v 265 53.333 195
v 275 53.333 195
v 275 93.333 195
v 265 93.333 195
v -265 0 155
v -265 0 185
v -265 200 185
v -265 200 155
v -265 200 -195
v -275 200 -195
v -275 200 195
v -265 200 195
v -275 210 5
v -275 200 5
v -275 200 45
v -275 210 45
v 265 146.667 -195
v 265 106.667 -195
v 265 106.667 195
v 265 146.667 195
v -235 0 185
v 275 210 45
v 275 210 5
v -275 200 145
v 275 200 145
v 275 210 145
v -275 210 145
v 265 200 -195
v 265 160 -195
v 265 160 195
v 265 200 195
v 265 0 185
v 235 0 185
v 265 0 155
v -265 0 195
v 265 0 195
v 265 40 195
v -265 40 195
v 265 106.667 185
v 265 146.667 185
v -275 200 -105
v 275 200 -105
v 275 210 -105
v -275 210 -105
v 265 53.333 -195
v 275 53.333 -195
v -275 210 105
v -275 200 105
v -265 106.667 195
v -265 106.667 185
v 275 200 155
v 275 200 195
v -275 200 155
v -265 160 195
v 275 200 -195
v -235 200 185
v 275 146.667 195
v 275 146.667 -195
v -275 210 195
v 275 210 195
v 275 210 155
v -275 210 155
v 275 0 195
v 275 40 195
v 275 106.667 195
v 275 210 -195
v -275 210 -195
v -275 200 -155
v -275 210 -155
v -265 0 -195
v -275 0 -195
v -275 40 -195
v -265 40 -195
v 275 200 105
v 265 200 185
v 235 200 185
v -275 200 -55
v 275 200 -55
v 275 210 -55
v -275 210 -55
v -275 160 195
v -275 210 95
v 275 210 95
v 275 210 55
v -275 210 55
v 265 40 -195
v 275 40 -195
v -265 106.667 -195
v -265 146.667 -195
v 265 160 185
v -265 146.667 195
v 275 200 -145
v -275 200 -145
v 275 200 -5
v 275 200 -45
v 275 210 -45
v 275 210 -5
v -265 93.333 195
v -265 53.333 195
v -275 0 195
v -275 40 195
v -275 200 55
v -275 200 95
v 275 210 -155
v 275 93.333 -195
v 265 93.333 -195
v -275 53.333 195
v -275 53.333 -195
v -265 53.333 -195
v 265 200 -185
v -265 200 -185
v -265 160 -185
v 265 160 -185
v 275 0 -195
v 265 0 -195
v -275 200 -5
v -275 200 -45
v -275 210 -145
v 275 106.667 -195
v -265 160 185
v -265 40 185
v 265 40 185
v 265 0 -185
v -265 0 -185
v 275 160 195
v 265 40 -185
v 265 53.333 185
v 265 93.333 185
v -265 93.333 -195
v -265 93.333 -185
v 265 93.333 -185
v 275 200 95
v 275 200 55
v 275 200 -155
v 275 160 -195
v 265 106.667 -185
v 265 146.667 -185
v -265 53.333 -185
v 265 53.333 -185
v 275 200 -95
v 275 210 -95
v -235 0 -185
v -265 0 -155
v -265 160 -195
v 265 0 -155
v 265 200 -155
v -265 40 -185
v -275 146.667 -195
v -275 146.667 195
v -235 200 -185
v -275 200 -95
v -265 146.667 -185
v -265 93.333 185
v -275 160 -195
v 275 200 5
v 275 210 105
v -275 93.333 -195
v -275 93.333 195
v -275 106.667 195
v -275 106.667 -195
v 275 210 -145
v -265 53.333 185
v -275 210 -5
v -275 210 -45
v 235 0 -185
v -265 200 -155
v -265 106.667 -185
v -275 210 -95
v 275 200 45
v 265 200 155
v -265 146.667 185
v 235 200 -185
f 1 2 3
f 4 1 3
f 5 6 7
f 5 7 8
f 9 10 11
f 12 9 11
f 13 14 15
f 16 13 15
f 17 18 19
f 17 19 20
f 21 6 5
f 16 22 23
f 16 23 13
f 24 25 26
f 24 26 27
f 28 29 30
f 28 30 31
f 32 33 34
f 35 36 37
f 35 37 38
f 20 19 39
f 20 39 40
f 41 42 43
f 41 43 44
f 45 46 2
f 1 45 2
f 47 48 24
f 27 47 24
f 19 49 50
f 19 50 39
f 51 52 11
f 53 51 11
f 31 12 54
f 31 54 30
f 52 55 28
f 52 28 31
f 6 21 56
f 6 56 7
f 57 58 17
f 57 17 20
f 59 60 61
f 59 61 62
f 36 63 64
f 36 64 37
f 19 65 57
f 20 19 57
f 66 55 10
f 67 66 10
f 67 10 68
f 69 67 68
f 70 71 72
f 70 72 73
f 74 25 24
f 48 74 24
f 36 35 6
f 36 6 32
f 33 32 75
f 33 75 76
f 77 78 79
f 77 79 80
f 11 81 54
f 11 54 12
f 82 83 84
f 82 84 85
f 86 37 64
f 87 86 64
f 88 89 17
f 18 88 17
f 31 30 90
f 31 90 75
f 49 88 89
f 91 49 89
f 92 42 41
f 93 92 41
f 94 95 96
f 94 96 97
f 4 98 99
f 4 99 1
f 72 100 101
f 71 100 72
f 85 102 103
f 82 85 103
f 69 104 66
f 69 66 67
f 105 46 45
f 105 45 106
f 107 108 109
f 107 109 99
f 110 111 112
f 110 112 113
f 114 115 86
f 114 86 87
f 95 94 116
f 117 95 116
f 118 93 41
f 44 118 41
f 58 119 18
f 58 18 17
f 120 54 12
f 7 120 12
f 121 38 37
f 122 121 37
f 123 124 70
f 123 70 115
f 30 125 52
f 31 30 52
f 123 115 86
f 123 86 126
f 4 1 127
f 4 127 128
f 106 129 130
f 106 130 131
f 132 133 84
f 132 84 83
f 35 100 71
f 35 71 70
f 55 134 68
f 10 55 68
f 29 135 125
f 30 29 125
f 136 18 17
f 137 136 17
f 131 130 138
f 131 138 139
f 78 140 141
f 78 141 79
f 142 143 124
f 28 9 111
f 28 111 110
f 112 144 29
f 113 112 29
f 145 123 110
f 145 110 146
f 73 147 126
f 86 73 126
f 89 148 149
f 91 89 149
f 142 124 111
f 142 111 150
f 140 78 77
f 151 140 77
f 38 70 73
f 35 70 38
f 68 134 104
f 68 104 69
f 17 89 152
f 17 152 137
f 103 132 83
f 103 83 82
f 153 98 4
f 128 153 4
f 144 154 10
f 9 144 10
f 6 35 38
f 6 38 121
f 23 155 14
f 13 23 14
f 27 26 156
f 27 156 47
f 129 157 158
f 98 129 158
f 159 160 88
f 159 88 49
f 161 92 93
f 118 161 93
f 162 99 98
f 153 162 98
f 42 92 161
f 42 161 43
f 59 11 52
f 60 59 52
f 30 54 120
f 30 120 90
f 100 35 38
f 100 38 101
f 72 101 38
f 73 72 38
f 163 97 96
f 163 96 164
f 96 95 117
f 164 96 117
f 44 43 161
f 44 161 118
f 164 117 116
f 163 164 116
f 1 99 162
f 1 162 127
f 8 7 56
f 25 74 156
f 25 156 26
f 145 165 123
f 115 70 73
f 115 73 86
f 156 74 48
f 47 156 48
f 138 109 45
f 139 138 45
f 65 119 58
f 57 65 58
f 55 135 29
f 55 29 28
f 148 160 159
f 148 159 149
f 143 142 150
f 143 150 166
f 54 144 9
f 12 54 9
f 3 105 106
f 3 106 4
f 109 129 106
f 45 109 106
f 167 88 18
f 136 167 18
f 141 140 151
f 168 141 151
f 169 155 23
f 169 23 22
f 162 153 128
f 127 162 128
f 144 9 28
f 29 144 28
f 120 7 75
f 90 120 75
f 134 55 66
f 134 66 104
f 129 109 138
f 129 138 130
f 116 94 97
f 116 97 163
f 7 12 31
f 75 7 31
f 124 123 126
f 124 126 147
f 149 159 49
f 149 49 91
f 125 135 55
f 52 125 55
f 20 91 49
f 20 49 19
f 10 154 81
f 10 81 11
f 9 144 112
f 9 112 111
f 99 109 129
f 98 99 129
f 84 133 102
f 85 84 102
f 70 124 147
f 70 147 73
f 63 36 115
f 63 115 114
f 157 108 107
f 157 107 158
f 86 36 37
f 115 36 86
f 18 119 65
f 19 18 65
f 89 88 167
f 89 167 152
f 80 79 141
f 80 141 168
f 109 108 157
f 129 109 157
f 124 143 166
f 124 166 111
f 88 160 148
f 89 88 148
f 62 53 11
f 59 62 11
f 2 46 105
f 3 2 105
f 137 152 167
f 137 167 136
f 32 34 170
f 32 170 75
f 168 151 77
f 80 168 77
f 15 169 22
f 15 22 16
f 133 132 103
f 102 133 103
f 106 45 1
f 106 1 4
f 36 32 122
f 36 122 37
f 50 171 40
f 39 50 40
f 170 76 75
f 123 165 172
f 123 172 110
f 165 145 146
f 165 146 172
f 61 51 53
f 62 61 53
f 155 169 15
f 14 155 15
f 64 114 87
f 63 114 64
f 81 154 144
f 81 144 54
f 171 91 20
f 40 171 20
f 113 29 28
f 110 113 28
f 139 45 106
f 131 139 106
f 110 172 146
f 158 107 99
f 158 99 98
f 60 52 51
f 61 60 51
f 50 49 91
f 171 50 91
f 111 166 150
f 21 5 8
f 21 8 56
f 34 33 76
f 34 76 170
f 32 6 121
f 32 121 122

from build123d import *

# Parameters (mm, degrees)
F4_DEPTH  = 40
F5_DEPTH  = 200
F6_DEPTH  = 40
F7_W      = 40
F7_H      = 390
F8_DEPTH  = 10
F10_W     = 530
F10_H     = 40
F11_DEPTH = 10
F13_W     = 530
F13_H     = 10
F14_DEPTH = 10
F13_W_2   = 550
F13_H_2   = 40
F15_DEPTH = 10


with BuildPart() as f4:
    # F3 (on Front) → F4 (new body)
    with BuildSketch(Plane.XZ):
        Polygon((-265, 195), (-275, 195), (-275, -195), (-265, -195), (-265, -185), (-265, -155), (-265, 155), (-265, 185), align=None)
    extrude(amount=-F4_DEPTH)


with BuildPart() as f4b:
    # F3 (on Front) → F4, piece 2 (new body)
    with BuildSketch(Plane.XZ):
        Polygon((275, 195), (265, 195), (265, 185), (265, 155), (265, -155), (265, -185), (265, -195), (275, -195), align=None)
    extrude(amount=-F4_DEPTH)


with BuildPart() as f5:
    # F3 (on Front) → F5 (new body)
    with BuildSketch(Plane.XZ):
        Polygon((-235, 185), (-265, 185), (-265, 155), align=None)
    extrude(amount=-F5_DEPTH)


with BuildPart() as f5b:
    # F3 (on Front) → F5, piece 2 (new body)
    with BuildSketch(Plane.XZ):
        Polygon((265, 155), (265, 185), (235, 185), align=None)
    extrude(amount=-F5_DEPTH)


with BuildPart() as f5c:
    # F3 (on Front) → F5, piece 3 (new body)
    with BuildSketch(Plane.XZ):
        Polygon((235, -185), (265, -185), (265, -155), align=None)
    extrude(amount=-F5_DEPTH)


with BuildPart() as f5d:
    # F3 (on Front) → F5, piece 4 (new body)
    with BuildSketch(Plane.XZ):
        Polygon((-265, -155), (-265, -185), (-235, -185), align=None)
    extrude(amount=-F5_DEPTH)


with BuildPart() as f6:
    # F3 (on Front) → F6 (new body)
    with BuildSketch(Plane.XZ):
        Polygon((265, 195), (-265, 195), (-265, 185), (-235, 185), (235, 185), (265, 185), align=None)
    extrude(amount=-F6_DEPTH)


with BuildPart() as f6b:
    # F3 (on Front) → F6, piece 2 (new body)
    with BuildSketch(Plane.XZ):
        Polygon((-265, -185), (-265, -195), (265, -195), (265, -185), (235, -185), (-235, -185), align=None)
    extrude(amount=-F6_DEPTH)


with BuildPart() as f8:
    # F7 (on face) → F8 (new body, through all)
    with BuildSketch(Plane.YZ.offset(275)):
        with Locations((73.3333333333, 0)):
            Rectangle(F7_W, F7_H)
    extrude(amount=-F8_DEPTH)


with BuildPart() as f8b:
    # F7 (on face) → F8, piece 2 (new body, through all)
    with BuildSketch(Plane.YZ.offset(275)):
        with Locations((126.6666666667, 0)):
            Rectangle(F7_W, F7_H)
    extrude(amount=-F8_DEPTH)


with BuildPart() as f8c:
    # F7 (on face) → F8, piece 3 (new body, through all)
    with BuildSketch(Plane.YZ.offset(275)):
        with Locations((180, 0)):
            Rectangle(F7_W, F7_H)
    extrude(amount=-F8_DEPTH)


with BuildPart() as f9_1:
    # F9: instance of F8
    add(f8.part.mirror(Plane.YZ))


with BuildPart() as f9_2:
    # F9: instance of F8b
    add(f8b.part.mirror(Plane.YZ))


with BuildPart() as f9_3:
    # F9: instance of F8c
    add(f8c.part.mirror(Plane.YZ))


with BuildPart() as f11:
    # F10 (on face) → F11 (new body, through all)
    with BuildSketch(Plane.XY.offset(195)):
        with Locations((0, 73.3333333333)):
            Rectangle(F10_W, F10_H)
    extrude(amount=-F11_DEPTH)


with BuildPart() as f11b:
    # F10 (on face) → F11, piece 2 (new body, through all)
    with BuildSketch(Plane.XY.offset(195)):
        with Locations((0, 126.6666666667)):
            Rectangle(F10_W, F10_H)
    extrude(amount=-F11_DEPTH)


with BuildPart() as f11c:
    # F10 (on face) → F11, piece 3 (new body, through all)
    with BuildSketch(Plane.XY.offset(195)):
        with Locations((0, 180)):
            Rectangle(F10_W, F10_H)
    extrude(amount=-F11_DEPTH)


with BuildPart() as f12_1:
    # F12: instance of F11
    add(f11.part.mirror(Plane.XY))


with BuildPart() as f12_2:
    # F12: instance of F11b
    add(f11b.part.mirror(Plane.XY))


with BuildPart() as f12_3:
    # F12: instance of F11c
    add(f11c.part.mirror(Plane.XY))


with BuildPart() as f14:
    # F13 (on face) → F14 (new body)
    with BuildSketch(Plane(origin=(0, 200, 0), x_dir=(-1, 0, 0), z_dir=(0, 1, 0))):
        Polygon((-265, 195), (-275, 195), (-275, 155), (275, 155), (275, 195), (265, 195), (265, 185), (-265, 185), align=None)
        with Locations((0, 190)):
            Rectangle(F13_W, F13_H)
    extrude(amount=F14_DEPTH)


with BuildPart() as f15:
    # F13 (on face) → F15 (new body)
    with BuildSketch(Plane(origin=(0, 200, 0), x_dir=(-1, 0, 0), z_dir=(0, 1, 0))):
        with Locations((0, 125)):
            Rectangle(F13_W_2, F13_H_2)
    extrude(amount=F15_DEPTH)


with BuildPart() as f15b:
    # F13 (on face) → F15, piece 2 (new body)
    with BuildSketch(Plane(origin=(0, 200, 0), x_dir=(-1, 0, 0), z_dir=(0, 1, 0))):
        with Locations((0, 75)):
            Rectangle(F13_W_2, F13_H_2)
    extrude(amount=F15_DEPTH)


with BuildPart() as f15c:
    # F13 (on face) → F15, piece 3 (new body)
    with BuildSketch(Plane(origin=(0, 200, 0), x_dir=(-1, 0, 0), z_dir=(0, 1, 0))):
        with Locations((0, 25)):
            Rectangle(F13_W_2, F13_H_2)
    extrude(amount=F15_DEPTH)


with BuildPart() as f15d:
    # F13 (on face) → F15, piece 4 (new body)
    with BuildSketch(Plane(origin=(0, 200, 0), x_dir=(-1, 0, 0), z_dir=(0, 1, 0))):
        with Locations((0, -25)):
            Rectangle(F13_W_2, F13_H_2)
    extrude(amount=F15_DEPTH)


with BuildPart() as f15e:
    # F13 (on face) → F15, piece 5 (new body)
    with BuildSketch(Plane(origin=(0, 200, 0), x_dir=(-1, 0, 0), z_dir=(0, 1, 0))):
        with Locations((0, -75)):
            Rectangle(F13_W_2, F13_H_2)
    extrude(amount=F15_DEPTH)


with BuildPart() as f15f:
    # F13 (on face) → F15, piece 6 (new body)
    with BuildSketch(Plane(origin=(0, 200, 0), x_dir=(-1, 0, 0), z_dir=(0, 1, 0))):
        with Locations((0, -125)):
            Rectangle(F13_W_2, F13_H_2)
    extrude(amount=F15_DEPTH)


with BuildPart() as f15g:
    # F13 (on face) → F15, piece 7 (new body)
    with BuildSketch(Plane(origin=(0, 200, 0), x_dir=(-1, 0, 0), z_dir=(0, 1, 0))):
        with Locations((0, -175)):
            Rectangle(F13_W_2, F13_H_2)
    extrude(amount=F15_DEPTH)


solid = Compound([f4.part, f4b.part, f5.part, f5b.part, f5c.part, f5d.part, f6.part, f6b.part, f8.part, f8b.part, f8c.part, f9_1.part, f9_2.part, f9_3.part, f11.part, f11b.part, f11c.part, f12_1.part, f12_2.part, f12_3.part, f14.part, f15.part, f15b.part, f15c.part, f15d.part, f15e.part, f15f.part, f15g.part])
